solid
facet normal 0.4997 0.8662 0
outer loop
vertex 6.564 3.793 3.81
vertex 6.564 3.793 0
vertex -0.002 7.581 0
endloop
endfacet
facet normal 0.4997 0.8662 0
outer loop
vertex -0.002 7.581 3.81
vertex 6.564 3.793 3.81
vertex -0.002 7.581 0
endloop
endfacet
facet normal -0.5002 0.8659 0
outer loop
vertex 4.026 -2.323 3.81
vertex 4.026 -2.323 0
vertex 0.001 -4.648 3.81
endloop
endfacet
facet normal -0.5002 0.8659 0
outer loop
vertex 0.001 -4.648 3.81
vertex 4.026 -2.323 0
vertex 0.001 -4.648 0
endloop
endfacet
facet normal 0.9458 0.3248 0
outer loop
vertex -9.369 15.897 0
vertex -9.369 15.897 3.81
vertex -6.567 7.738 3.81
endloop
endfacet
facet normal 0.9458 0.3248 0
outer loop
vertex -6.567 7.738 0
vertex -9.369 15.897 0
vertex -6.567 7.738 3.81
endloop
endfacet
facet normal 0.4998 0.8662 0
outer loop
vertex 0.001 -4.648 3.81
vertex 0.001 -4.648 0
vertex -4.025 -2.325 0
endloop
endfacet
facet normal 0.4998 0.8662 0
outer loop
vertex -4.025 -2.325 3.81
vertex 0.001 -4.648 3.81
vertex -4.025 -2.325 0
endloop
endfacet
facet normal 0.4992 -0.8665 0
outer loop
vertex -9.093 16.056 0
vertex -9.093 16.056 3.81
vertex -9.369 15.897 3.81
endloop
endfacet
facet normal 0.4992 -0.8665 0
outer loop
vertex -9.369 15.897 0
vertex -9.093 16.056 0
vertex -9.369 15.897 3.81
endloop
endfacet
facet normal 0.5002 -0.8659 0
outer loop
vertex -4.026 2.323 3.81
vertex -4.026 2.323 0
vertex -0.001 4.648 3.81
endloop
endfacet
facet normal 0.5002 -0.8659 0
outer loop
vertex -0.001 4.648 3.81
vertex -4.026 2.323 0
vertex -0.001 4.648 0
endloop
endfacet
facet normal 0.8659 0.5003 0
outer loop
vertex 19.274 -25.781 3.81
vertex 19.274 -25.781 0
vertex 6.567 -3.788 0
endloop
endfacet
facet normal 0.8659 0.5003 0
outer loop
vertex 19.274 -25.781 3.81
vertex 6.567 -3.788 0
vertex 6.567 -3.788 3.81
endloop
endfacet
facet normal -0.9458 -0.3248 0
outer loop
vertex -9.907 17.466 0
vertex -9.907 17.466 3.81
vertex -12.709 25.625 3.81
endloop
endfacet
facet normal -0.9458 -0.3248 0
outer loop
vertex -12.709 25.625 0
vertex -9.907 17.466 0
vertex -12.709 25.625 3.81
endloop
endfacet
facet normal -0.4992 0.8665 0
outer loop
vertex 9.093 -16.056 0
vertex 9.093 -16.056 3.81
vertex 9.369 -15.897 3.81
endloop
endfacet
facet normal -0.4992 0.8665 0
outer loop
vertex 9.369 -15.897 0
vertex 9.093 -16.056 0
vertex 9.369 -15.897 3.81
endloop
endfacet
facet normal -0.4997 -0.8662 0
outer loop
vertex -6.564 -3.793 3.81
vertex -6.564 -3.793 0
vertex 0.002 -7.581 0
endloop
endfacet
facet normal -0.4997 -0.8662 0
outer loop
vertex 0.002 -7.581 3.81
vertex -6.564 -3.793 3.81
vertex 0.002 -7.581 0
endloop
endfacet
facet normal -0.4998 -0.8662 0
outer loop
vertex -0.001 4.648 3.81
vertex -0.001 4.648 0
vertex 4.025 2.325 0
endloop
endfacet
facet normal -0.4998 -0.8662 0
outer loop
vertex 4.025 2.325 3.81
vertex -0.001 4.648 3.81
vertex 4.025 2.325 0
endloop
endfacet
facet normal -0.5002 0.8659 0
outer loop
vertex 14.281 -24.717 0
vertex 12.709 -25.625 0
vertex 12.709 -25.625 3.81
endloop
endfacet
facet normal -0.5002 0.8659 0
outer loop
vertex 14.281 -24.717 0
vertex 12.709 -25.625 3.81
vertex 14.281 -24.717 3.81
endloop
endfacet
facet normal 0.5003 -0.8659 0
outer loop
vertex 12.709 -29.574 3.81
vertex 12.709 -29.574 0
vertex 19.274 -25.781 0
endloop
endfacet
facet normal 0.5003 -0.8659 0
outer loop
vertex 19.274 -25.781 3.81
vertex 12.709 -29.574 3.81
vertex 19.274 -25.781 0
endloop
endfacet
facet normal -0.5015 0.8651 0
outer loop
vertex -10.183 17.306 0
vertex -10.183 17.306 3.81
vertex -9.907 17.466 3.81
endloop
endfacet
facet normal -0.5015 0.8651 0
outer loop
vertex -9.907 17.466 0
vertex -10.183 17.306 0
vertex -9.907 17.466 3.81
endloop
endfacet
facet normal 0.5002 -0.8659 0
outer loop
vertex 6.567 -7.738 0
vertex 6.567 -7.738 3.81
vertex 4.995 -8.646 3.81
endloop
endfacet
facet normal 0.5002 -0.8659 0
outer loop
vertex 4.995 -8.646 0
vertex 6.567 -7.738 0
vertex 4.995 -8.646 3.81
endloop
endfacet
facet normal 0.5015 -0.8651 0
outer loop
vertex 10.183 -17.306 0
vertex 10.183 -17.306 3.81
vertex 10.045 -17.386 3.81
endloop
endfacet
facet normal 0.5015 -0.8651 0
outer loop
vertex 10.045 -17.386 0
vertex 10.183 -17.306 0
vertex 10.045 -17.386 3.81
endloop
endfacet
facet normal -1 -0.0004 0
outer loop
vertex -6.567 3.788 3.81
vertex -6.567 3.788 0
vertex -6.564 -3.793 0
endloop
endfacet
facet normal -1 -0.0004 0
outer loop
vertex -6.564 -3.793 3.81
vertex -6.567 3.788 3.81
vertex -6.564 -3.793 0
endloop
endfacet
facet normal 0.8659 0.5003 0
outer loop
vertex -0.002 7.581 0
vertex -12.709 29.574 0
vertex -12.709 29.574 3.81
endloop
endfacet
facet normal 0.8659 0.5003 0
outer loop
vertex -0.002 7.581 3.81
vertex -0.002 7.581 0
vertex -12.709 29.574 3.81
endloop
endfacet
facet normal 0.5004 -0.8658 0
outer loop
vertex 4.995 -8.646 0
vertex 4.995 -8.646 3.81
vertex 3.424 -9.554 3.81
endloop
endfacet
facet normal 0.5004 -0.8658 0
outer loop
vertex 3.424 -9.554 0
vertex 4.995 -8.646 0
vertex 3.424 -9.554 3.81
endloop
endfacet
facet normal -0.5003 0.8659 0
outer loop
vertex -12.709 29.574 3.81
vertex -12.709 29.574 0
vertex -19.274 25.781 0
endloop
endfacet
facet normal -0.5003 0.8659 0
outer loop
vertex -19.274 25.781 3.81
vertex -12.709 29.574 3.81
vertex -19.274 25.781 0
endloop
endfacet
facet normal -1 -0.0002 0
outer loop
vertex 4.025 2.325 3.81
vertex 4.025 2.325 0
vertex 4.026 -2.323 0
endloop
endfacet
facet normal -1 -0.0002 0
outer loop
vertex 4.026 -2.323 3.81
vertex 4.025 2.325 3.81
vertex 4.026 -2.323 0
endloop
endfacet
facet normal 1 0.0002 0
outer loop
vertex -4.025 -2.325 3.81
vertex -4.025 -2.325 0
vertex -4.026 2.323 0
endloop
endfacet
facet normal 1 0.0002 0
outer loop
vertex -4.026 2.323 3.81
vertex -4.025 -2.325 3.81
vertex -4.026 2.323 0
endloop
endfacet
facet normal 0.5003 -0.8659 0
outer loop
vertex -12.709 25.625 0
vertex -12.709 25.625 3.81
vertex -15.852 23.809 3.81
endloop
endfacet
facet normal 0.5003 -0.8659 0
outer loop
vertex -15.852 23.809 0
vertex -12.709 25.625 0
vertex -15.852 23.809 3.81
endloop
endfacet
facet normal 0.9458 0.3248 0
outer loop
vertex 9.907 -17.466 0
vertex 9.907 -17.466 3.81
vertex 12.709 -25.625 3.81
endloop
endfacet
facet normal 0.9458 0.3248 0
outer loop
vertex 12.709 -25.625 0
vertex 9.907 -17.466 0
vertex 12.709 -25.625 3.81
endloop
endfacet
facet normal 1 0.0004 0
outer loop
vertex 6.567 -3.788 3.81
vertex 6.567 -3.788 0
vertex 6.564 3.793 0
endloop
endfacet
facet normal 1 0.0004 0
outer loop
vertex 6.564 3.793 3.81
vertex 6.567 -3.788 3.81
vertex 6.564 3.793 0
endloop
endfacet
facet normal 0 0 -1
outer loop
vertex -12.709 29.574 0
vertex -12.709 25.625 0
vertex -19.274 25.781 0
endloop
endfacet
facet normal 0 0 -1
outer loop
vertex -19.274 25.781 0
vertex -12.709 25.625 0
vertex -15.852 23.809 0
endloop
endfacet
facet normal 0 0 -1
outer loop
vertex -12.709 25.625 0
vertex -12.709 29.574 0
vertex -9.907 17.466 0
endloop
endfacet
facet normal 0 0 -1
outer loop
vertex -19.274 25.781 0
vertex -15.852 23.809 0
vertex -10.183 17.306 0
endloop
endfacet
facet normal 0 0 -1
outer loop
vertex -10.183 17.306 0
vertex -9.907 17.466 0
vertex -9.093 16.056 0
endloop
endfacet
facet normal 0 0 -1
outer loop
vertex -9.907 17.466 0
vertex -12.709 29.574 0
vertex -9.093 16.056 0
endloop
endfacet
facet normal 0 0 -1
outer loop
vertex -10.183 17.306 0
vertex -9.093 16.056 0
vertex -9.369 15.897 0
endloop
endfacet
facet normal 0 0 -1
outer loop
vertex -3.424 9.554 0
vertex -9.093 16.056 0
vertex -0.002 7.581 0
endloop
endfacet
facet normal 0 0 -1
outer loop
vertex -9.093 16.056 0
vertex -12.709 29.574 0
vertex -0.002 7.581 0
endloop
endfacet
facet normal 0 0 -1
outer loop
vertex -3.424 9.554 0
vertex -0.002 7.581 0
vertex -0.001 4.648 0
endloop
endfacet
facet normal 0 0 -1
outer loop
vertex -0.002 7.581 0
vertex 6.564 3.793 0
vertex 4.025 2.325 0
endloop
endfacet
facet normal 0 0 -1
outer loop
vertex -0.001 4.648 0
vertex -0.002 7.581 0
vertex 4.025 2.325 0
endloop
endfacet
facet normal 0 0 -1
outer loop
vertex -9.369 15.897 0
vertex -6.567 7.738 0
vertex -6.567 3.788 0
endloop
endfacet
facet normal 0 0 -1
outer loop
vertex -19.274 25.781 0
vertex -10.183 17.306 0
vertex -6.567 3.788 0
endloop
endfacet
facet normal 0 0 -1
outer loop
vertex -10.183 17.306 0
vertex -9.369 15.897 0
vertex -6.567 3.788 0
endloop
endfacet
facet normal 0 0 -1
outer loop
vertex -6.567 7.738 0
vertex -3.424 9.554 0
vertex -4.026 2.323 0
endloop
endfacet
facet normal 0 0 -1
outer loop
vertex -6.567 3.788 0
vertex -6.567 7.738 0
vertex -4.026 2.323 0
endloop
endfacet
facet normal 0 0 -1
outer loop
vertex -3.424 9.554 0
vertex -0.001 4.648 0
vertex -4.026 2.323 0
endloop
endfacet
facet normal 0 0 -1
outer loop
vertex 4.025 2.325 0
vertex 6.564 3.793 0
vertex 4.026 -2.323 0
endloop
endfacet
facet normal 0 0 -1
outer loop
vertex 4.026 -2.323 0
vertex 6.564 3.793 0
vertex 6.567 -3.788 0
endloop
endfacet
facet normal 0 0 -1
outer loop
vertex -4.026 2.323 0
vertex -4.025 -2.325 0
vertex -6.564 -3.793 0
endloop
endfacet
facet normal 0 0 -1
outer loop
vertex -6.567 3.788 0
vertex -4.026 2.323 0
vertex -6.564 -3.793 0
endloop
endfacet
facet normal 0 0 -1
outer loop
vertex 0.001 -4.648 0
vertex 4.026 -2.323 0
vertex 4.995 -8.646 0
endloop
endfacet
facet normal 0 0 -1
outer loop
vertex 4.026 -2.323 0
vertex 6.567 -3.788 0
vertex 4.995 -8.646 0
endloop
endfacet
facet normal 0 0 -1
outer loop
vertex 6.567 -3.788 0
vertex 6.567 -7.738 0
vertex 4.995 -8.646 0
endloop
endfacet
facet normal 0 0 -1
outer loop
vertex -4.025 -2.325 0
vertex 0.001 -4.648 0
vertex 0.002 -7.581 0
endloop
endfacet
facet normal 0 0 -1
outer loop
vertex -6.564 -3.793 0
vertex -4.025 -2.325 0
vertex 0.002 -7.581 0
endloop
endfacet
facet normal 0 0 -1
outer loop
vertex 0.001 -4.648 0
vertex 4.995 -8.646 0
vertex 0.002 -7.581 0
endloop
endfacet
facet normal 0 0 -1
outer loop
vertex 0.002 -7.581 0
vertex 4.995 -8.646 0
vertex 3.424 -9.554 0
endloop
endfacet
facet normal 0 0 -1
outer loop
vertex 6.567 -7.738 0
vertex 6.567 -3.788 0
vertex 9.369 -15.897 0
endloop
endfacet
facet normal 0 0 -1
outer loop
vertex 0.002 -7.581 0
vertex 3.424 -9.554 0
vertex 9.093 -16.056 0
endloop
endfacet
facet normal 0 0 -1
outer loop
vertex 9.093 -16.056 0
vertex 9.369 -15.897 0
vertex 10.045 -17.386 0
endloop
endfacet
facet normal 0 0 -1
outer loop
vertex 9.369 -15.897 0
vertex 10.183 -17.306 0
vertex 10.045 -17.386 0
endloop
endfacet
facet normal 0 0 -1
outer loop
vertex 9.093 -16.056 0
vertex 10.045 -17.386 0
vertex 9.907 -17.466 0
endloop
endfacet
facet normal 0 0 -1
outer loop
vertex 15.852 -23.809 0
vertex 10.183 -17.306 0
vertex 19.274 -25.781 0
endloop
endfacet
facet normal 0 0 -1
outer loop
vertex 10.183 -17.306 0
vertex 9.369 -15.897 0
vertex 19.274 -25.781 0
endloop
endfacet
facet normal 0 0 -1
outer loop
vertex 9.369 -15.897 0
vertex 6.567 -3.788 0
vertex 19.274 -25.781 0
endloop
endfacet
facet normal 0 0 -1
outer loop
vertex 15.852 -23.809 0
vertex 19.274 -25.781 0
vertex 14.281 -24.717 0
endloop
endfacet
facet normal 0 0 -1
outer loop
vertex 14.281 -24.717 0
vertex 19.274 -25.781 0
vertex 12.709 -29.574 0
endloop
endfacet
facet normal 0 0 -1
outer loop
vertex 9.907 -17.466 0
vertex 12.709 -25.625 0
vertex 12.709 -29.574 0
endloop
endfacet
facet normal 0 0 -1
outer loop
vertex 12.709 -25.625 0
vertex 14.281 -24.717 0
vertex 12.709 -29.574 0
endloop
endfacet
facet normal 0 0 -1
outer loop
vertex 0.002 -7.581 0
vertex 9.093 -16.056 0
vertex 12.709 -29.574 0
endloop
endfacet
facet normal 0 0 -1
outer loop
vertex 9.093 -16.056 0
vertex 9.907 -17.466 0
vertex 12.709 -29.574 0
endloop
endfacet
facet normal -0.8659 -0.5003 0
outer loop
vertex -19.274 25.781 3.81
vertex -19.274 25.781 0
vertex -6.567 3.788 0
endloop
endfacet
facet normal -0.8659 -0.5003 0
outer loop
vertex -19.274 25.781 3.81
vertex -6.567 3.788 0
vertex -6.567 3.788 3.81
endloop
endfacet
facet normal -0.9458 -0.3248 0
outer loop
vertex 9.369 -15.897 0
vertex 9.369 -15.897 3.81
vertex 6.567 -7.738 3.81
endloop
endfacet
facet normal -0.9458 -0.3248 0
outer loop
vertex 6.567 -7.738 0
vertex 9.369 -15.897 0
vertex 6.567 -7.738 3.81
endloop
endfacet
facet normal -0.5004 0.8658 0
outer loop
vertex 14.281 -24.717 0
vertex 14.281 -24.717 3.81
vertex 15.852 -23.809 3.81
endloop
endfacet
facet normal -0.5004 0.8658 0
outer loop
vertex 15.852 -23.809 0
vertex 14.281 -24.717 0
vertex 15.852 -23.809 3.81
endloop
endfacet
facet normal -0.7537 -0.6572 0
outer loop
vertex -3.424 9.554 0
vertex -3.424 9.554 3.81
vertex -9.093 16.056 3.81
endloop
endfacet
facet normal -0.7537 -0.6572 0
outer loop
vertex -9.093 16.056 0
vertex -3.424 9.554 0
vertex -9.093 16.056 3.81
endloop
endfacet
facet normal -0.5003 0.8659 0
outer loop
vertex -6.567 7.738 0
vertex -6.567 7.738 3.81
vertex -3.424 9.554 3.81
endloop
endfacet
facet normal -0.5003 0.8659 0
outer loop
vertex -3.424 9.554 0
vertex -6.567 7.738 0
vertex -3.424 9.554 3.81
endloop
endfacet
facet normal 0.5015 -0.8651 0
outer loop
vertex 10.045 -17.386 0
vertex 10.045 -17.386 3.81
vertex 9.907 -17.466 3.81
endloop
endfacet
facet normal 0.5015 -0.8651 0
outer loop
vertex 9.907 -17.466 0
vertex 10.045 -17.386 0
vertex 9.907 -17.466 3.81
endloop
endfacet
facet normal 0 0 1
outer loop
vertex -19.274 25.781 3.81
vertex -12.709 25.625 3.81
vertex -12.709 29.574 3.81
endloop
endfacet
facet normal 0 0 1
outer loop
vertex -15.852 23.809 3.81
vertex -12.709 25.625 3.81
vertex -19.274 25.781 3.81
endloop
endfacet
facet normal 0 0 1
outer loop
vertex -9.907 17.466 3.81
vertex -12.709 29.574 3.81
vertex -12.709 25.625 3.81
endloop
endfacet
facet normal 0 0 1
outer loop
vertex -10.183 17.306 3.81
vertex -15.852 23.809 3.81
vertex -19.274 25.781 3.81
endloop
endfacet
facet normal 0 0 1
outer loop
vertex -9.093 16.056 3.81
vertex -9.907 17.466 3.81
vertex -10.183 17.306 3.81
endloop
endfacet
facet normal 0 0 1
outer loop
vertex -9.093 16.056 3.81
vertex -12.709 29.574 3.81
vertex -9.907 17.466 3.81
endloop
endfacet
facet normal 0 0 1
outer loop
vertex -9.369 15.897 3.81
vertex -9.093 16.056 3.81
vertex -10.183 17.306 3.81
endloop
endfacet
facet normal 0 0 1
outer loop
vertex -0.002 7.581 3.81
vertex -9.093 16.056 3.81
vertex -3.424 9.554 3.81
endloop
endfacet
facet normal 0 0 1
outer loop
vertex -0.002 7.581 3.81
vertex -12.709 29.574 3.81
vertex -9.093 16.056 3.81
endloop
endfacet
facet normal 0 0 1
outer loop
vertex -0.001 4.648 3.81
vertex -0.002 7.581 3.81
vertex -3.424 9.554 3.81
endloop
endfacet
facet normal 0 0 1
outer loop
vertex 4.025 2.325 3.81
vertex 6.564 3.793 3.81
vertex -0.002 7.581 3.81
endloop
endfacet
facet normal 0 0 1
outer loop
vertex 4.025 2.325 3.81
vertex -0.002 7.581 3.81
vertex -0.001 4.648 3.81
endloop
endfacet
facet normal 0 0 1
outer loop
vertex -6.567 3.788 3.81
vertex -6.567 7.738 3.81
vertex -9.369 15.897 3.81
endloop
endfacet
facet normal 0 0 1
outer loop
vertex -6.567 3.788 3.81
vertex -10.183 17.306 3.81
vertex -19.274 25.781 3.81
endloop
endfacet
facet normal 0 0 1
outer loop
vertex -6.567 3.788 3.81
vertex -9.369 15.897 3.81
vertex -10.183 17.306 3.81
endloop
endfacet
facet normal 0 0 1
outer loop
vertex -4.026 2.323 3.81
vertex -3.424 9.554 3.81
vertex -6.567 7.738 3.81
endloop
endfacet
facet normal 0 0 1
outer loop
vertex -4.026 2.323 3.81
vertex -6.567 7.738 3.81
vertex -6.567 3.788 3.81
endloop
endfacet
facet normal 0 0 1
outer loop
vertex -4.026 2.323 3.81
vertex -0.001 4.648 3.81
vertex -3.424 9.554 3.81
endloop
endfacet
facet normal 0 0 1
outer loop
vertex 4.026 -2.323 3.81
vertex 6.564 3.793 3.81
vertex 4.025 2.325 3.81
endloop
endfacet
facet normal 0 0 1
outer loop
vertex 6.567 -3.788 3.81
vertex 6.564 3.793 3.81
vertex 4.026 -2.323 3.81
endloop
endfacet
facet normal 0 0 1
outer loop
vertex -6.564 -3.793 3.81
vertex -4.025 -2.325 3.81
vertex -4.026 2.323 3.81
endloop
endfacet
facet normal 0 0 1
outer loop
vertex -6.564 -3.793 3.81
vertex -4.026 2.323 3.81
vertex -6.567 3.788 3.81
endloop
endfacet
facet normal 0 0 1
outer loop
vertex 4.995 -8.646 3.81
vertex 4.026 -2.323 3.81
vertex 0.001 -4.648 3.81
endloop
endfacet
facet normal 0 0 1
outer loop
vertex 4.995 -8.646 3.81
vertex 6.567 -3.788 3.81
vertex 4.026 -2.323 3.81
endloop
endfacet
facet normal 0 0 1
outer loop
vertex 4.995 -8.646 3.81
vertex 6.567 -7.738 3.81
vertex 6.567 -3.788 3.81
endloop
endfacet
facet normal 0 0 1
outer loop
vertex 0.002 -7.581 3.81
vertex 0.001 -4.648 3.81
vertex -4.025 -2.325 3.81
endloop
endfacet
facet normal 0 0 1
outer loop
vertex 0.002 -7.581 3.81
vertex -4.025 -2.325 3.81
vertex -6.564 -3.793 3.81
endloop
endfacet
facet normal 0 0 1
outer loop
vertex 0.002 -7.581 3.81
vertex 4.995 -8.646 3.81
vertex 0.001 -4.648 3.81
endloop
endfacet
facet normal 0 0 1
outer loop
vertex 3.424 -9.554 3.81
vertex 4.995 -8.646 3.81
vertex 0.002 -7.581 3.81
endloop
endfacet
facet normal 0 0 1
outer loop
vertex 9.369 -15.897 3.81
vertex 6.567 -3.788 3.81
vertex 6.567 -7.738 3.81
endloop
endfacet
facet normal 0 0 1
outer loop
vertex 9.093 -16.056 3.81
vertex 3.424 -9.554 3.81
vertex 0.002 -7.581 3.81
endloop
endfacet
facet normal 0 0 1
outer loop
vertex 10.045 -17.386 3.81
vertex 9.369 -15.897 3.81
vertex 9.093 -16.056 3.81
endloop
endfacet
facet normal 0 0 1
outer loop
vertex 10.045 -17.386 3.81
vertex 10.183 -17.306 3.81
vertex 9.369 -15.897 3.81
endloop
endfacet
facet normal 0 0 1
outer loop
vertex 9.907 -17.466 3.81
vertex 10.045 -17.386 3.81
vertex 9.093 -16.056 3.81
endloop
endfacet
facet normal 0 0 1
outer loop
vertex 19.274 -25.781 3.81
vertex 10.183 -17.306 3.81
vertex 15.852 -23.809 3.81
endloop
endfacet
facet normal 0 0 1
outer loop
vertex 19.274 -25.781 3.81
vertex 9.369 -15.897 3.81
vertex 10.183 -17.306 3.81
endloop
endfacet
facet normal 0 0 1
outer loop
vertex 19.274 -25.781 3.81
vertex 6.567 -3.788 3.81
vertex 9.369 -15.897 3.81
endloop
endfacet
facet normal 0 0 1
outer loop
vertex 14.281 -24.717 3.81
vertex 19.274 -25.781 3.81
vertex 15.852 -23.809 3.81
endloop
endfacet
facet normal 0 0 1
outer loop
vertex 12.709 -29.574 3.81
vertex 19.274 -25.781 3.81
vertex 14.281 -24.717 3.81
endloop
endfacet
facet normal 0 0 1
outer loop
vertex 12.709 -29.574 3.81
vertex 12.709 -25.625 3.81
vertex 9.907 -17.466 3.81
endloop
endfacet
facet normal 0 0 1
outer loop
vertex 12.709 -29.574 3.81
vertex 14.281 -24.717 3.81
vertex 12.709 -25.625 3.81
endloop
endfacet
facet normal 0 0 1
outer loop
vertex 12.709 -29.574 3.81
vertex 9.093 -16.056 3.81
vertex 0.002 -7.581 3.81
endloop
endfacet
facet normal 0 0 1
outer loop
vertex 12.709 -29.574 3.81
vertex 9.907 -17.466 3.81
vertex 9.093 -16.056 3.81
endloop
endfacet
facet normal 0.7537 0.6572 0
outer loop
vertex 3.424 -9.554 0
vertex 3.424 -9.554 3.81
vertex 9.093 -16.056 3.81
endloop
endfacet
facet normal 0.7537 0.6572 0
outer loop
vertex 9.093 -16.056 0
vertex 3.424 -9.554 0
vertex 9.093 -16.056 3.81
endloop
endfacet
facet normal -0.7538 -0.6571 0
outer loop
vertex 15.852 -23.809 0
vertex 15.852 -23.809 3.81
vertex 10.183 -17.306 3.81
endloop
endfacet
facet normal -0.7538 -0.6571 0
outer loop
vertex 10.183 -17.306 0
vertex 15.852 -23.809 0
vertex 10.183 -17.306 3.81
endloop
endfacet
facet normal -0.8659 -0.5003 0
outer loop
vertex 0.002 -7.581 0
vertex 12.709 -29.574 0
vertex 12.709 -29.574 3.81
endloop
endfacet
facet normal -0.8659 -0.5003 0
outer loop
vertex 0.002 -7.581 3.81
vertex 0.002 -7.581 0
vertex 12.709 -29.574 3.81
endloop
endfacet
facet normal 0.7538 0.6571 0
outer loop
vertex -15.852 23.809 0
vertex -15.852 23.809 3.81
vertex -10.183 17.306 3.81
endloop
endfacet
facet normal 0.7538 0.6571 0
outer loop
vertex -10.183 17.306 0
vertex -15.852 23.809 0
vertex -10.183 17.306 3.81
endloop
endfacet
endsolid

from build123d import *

# Parameters (mm, degrees)
F1_DEPTH = 3.81
F2_DEPTH = 25.4
F4_DEPTH = 25.4
F5_DEPTH = 25.4
F7_DEPTH = 25.4


with BuildPart() as f1:
    # F0 (on Top) → F1 (new body)
    with BuildSketch(Plane.XY):
        Polygon((6.5642443103, 3.7926732977), (-0.0024292689, 7.5811389783), (-6.5666735793, 3.7884656805), (-6.5642443103, -3.7926732977), (0.0024292689, -7.5811389783), (6.5666735793, -3.7884656805), align=None)
        Polygon((-4.0262038002, 2.3228099792), (-0.00148945, 4.6481997614), (4.0247143502, 2.3253897822), (4.0262038002, -2.3228099792), (0.00148945, -4.6481997614), (-4.0247143502, -2.3253897822), align=None, mode=Mode.SUBTRACT)
    extrude(amount=F1_DEPTH)

    # F2 (add): a face of the model
    f2_faces = [f1.faces().sort_by_distance(p)[0] for p in [
        (3.2845514241, -5.6848023294, 1.905),
    ]]
    extrude(f2_faces, amount=F2_DEPTH)

    # F3 (on face) → F4 (cut)
    with BuildSketch(Plane.XY.offset(3.81)):
        Polygon((3.4240530816, -9.5536917259), (9.0931520865, -16.0562525411), (9.3687364086, -15.8970260939), (6.5666733931, -7.7379561169), (4.9953633304, -8.6458238677), align=None)
        Polygon((9.9074144135, -17.4655531656), (12.7094772591, -25.6246232408), (14.2807875079, -24.7167553825), (10.0452065827, -17.3859399373), align=None)
        Polygon((10.0452065827, -17.3859399373), (14.2807875079, -24.7167553825), (15.8520975706, -23.8088876318), (10.1829987356, -17.3063267185), align=None)
    extrude(amount=-F4_DEPTH, mode=Mode.SUBTRACT)

    # F5 (add): a face of the model
    f5_faces = [f1.faces().sort_by_distance(p)[0] for p in [
        (-3.2845514241, 5.6848023294, 1.905),
    ]]
    extrude(f5_faces, amount=F5_DEPTH)

    # F6 (on face) → F7 (cut)
    with BuildSketch(Plane.XY.offset(3.81)):
        Polygon((6.5666733931, -7.7379561169), (3.4240530816, -9.5536917259), (9.0931520865, -16.0562525411), (9.3687364086, -15.8970260939), align=None)
        Polygon((12.7094772591, -25.6246232408), (15.8520975706, -23.8088876318), (10.1829987356, -17.3063267185), (9.9074144135, -17.4655531656), align=None)
        Polygon((-9.3687364249, 15.8970260845), (-6.5666735793, 7.7379560094), (-3.4240532678, 9.5536916184), (-9.0931521028, 16.0562525317), align=None)
        Polygon((-9.9074144298, 17.4655531562), (-12.7094774453, 25.6246231332), (-15.8520977568, 23.8088875242), (-10.1829987519, 17.306326709), align=None)
    extrude(amount=-F7_DEPTH, mode=Mode.SUBTRACT)


solid = f1.part
